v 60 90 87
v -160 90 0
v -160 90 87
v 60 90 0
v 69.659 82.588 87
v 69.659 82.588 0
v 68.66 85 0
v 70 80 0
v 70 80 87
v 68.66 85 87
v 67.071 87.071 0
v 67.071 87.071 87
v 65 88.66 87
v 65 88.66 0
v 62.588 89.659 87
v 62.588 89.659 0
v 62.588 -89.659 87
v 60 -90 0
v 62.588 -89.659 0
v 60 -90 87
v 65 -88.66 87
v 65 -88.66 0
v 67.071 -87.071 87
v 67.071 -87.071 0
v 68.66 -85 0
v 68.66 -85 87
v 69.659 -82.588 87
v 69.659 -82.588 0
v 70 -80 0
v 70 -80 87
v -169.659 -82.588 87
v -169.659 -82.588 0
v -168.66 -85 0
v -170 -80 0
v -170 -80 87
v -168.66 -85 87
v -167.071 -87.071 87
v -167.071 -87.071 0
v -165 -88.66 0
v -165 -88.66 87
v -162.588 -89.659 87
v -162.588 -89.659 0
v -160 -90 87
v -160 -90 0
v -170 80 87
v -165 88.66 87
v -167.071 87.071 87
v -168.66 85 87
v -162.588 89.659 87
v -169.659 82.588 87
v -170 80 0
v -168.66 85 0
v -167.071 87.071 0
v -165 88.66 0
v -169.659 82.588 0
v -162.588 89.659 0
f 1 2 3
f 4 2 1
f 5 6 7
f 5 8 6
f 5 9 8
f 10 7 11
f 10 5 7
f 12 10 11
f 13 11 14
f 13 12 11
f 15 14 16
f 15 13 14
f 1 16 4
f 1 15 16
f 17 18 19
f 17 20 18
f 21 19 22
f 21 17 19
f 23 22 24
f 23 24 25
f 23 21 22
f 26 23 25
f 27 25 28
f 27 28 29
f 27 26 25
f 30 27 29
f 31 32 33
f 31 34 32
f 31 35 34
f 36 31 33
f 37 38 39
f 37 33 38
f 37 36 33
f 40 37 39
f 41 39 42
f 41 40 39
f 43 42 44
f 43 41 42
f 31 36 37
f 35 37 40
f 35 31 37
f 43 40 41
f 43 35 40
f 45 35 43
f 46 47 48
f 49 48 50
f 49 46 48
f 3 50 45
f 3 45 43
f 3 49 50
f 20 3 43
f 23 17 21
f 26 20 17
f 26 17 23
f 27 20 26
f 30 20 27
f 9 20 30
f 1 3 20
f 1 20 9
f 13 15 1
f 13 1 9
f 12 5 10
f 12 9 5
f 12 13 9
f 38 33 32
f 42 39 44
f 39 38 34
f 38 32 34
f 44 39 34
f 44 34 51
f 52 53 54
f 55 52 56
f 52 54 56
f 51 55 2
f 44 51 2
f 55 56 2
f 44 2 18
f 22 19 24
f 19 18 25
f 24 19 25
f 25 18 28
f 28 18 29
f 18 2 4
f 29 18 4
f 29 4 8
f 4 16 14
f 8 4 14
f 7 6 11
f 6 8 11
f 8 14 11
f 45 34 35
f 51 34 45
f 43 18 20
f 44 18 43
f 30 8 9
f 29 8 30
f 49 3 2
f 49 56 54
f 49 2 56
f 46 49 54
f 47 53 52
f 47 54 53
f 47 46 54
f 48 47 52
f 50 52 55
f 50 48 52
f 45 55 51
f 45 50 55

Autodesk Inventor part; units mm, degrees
ref_plane "YZ Plane" through (0, 0, 0) normal (1, 0, 0) x (0, 1, 0)
ref_plane "XZ Plane" through (0, 0, 0) normal (0, 1, 0) x (-1, 0, 0)
ref_plane "XY Plane" through (0, 0, 0) normal (0, 0, 1) x (1, 0, 0)
sketch "スケッチ1" plane through (0, 0, 0) normal (0, 0, 1) x (1, 0, 0)
  circle A0 centre (0, 0) radius 60
  line L0 (70, -90) -> (-170, -90)
  line L1 (-170, -90) -> (-170, 90)
  line L2 (-170, 90) -> (70, 90)
  line L3 (70, 90) -> (70, -90)
  line L4 (70, -90) -> (-170, 90) construction
  line L5 (-170, -90) -> (70, 90) construction
  point P0 (-50, 0)
  point P1 (-50, 0)
  point P2 (-50, 0)
  dimension "d0" = 120
  dimension "d3" = 240
  dimension "d4" = 180
  dimension "d10" = 70
extrude "押し出し1" add sketch "スケッチ1" along normal blind 87 contours A0 | L0 L1 L2 L3
fillet "フィレット1" radius 10 4 edges at (70, 90, 43.5) (-170, 90, 43.5) (-170, -90, 43.5) (70, -90, 43.5)
properties part number "link0"
